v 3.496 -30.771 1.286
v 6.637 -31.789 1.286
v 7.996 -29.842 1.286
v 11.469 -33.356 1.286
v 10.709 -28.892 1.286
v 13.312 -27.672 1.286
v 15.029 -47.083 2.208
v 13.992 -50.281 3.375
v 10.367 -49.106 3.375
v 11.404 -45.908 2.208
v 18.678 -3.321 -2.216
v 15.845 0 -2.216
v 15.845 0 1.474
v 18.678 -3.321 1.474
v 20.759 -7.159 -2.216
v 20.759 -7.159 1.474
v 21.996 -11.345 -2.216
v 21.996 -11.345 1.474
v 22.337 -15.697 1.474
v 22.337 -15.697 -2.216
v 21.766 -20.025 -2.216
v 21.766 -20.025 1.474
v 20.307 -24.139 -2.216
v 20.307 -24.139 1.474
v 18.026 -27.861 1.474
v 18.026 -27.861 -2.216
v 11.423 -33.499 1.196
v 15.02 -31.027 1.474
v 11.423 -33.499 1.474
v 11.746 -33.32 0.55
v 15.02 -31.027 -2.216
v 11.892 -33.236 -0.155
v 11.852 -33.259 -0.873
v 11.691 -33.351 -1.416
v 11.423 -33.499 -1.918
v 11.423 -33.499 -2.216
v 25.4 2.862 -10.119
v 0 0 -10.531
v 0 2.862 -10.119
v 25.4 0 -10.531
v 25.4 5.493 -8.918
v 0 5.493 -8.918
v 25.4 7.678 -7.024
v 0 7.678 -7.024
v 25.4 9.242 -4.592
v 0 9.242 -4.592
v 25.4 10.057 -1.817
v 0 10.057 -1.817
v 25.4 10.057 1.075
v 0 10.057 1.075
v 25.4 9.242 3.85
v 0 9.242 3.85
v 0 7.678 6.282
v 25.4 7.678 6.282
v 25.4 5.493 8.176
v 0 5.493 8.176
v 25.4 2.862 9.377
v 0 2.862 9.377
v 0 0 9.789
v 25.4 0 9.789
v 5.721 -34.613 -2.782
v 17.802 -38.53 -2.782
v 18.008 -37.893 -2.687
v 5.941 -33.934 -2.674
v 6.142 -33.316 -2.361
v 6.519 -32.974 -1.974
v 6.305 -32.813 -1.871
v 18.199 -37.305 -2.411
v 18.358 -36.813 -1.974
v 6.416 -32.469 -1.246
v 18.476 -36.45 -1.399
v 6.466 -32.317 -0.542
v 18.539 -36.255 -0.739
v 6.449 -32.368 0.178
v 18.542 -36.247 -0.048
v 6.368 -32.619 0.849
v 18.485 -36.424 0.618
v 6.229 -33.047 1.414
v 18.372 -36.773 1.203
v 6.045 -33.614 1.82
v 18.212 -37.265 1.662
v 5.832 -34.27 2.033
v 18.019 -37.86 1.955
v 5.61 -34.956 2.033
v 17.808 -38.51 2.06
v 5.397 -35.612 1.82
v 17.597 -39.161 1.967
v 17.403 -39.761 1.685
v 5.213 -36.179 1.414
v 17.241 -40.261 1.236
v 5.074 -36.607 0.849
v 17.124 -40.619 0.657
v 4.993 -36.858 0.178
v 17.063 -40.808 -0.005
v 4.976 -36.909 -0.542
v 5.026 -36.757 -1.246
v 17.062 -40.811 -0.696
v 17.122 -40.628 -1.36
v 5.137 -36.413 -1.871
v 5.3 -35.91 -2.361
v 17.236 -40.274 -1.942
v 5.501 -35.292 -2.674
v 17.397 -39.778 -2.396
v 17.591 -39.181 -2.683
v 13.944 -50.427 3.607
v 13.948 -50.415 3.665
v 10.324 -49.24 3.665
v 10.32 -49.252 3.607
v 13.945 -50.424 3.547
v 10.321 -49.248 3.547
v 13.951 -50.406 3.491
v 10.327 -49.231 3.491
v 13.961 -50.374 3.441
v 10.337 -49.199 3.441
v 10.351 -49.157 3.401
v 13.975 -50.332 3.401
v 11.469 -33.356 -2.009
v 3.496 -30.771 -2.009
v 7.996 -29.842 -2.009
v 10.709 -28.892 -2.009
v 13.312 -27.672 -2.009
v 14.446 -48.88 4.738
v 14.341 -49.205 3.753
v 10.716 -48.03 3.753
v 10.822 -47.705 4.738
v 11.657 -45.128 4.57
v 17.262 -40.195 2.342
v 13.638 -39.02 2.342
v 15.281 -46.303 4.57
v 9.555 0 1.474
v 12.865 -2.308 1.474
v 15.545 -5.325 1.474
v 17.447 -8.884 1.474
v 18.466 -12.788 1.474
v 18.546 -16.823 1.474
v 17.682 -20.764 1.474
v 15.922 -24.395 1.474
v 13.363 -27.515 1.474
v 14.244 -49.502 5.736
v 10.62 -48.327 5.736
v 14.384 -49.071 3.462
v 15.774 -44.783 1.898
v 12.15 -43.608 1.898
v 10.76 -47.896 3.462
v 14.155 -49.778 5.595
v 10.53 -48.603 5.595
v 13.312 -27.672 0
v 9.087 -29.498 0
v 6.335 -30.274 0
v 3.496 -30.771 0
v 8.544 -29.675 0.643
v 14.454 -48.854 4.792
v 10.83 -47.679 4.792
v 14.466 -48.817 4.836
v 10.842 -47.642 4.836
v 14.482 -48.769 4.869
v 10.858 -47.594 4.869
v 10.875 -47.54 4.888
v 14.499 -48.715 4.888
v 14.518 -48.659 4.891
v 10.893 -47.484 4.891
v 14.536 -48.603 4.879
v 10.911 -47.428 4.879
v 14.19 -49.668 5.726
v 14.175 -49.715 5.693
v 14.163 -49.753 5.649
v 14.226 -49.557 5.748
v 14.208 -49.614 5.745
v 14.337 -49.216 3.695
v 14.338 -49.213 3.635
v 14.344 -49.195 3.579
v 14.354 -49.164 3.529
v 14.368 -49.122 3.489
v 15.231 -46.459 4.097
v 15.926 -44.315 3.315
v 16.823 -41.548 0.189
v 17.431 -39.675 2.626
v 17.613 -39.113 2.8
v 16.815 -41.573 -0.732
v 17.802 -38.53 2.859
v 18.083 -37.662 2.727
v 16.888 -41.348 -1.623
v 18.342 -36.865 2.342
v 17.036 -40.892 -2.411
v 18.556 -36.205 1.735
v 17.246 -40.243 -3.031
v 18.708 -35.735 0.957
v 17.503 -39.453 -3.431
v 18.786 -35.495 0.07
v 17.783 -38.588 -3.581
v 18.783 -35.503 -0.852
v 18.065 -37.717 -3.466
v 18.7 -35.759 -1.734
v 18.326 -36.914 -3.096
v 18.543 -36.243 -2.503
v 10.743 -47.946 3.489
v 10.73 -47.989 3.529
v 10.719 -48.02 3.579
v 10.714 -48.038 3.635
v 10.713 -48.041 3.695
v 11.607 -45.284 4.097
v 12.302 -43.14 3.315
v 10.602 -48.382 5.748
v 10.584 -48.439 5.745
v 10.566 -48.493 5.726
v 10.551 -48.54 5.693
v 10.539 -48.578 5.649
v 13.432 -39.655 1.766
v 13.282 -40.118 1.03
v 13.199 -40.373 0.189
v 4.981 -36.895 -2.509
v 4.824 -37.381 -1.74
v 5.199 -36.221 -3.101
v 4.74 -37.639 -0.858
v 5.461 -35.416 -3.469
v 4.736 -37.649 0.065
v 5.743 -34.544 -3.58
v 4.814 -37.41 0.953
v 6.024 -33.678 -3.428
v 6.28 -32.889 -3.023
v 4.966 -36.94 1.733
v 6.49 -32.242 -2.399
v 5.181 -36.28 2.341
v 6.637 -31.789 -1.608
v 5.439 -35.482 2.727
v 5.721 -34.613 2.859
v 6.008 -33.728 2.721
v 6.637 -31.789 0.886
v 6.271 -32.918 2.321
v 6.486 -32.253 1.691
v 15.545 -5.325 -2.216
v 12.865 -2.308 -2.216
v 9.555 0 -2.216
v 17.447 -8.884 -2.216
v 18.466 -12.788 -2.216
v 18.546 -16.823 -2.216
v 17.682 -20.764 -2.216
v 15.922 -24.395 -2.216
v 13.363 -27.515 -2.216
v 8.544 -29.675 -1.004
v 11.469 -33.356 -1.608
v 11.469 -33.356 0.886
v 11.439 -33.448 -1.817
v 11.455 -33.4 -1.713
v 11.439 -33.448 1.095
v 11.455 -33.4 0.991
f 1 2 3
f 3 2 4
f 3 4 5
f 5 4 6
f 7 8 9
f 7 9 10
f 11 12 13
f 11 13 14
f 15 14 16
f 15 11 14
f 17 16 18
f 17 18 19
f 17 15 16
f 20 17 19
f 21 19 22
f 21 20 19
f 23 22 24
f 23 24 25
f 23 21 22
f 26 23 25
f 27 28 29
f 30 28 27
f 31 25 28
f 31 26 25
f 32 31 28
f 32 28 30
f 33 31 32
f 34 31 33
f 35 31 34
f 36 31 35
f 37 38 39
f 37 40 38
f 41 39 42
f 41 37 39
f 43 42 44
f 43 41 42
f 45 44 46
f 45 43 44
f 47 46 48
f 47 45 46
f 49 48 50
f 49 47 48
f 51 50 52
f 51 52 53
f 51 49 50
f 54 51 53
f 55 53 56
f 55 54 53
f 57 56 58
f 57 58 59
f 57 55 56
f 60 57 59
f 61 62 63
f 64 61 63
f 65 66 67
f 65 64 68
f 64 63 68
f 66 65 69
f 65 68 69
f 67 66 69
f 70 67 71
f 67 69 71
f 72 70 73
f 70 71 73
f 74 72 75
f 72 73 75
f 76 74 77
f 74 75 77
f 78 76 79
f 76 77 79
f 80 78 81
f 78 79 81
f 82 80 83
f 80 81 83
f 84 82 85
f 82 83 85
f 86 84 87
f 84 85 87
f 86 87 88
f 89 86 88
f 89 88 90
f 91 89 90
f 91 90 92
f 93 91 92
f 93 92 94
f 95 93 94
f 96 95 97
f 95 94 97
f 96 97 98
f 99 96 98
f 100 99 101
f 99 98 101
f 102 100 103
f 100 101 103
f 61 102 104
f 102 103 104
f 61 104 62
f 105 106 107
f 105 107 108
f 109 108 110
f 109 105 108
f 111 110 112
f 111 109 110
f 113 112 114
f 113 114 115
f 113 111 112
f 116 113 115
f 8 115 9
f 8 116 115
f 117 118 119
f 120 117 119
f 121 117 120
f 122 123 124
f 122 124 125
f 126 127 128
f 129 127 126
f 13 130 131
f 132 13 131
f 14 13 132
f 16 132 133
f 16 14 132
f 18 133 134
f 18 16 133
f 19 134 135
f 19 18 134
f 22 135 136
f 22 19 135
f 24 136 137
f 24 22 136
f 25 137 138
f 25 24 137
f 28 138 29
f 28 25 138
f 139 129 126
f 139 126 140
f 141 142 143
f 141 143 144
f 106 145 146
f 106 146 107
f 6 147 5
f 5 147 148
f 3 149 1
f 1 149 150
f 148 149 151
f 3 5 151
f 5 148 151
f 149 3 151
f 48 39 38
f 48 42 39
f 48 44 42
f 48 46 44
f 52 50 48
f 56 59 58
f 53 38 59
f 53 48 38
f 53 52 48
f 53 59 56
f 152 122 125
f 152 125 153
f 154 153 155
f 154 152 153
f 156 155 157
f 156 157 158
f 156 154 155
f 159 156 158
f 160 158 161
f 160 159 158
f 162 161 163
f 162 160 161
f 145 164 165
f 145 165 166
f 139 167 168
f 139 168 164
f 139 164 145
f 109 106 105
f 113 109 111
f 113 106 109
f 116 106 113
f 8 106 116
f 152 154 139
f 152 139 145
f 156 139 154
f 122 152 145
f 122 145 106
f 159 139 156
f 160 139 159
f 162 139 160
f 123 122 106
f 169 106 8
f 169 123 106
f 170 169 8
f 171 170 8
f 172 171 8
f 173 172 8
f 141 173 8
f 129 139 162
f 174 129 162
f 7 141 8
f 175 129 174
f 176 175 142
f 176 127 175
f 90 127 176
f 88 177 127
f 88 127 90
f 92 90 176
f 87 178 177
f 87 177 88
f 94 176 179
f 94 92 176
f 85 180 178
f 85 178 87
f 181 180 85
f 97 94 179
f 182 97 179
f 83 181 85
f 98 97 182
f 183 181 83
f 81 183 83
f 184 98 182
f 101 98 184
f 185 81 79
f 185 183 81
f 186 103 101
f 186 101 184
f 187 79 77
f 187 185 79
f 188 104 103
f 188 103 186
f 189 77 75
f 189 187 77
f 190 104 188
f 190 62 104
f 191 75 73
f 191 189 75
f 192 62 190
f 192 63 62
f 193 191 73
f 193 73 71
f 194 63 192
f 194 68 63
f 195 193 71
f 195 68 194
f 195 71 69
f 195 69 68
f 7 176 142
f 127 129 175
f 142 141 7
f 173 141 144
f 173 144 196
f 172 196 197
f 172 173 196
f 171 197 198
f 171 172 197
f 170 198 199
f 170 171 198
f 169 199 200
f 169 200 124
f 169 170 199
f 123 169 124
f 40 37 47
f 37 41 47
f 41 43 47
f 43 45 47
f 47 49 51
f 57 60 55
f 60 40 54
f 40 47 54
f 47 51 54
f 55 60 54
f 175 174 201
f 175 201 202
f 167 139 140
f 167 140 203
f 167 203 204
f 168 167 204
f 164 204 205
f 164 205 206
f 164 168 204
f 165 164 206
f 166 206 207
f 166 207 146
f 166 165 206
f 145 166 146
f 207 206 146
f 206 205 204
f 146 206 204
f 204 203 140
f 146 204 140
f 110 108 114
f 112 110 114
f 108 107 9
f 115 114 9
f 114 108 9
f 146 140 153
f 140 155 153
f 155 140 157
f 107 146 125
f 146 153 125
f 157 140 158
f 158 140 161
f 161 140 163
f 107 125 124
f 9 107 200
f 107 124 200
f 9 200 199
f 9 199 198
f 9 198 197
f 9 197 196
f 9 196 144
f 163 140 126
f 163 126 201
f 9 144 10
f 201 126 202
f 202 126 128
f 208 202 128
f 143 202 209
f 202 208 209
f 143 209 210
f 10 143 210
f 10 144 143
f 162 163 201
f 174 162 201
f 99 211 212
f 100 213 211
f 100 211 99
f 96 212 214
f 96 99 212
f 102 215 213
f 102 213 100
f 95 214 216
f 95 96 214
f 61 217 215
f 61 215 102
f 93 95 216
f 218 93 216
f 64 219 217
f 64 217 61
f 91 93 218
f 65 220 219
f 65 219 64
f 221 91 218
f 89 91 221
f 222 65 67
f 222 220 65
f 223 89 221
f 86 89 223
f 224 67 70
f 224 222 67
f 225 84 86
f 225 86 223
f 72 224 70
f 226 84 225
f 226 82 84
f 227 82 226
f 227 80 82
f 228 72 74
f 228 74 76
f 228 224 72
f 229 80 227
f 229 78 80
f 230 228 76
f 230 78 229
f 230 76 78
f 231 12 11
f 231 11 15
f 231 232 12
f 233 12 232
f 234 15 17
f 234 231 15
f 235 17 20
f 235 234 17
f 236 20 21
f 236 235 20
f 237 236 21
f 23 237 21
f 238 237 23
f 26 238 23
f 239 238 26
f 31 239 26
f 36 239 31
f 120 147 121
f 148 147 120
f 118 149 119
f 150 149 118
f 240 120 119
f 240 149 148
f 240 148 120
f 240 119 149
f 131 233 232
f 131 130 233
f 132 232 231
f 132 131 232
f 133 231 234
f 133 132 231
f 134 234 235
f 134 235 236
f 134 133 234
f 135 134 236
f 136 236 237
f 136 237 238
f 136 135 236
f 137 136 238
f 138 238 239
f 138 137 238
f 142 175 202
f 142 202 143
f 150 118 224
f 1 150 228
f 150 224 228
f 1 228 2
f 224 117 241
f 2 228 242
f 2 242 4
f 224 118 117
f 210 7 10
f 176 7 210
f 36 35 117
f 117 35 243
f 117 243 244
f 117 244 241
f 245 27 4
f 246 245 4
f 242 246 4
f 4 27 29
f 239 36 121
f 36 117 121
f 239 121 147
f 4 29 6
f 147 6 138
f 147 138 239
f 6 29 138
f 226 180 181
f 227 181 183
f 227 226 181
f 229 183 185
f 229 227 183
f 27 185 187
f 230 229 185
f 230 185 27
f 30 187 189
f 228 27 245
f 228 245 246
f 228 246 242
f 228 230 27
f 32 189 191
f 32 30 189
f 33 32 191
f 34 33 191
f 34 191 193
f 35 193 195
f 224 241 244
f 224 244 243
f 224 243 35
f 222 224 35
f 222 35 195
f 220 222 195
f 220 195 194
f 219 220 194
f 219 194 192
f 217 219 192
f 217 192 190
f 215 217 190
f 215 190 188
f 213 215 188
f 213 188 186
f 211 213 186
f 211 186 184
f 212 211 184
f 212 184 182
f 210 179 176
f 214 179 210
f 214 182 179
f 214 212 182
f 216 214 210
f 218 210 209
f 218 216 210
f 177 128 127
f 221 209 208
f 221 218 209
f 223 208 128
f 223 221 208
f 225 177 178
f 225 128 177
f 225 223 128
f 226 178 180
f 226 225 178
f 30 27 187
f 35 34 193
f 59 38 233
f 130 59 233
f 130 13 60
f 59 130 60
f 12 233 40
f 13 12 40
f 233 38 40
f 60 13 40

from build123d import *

# Parameters (mm, degrees)
SKETCH1_W               = 25.4
SKETCH1_H               = 10.16
REVOLVE1_ANGLE          = 180
SKETCH4_W               = 6.29000012
SKETCH4_H               = 3.69
SKETCH6_W               = 3.294985449
SKETCH6_H               = 5.974962046
BOSS_EXTRUDE1_DEPTH     = 5.08
SKETCH7_R               = 3.22
BOSS_EXTRUDE7_DEPTH     = 12.7
SKETCH9_W               = 3.294985449
SKETCH9_H               = 5.974962046
BOSS_EXTRUDE8_DEPTH     = 3.302
CUT_EXTRUDE1_DEPTH      = 3.302
CUT_EXTRUDE1_DEPTH_BACK = 3.302
SKETCH11_R              = 2.375
CUT_EXTRUDE2_DEPTH      = 2.54
CUT_EXTRUDE2_DEPTH_BACK = 12.446
BOSS_EXTRUDE11_DEPTH    = 3.81
SKETCH14_R              = 2.420907349
CUT_EXTRUDE3_DEPTH      = 22.606


with BuildPart() as part:
    # Sketch1 → Revolve1 (revolve)
    with BuildSketch(Plane(origin=(0, 0, 0), x_dir=(1, 0, 0), z_dir=(0, 1, 0))):
        with Locations((12.7, 5.451011236)):
            Rectangle(SKETCH1_W, SKETCH1_H)
    revolve(axis=Axis((0, 0, -0.371011236), (1, 0, 0)), revolution_arc=REVOLVE1_ANGLE)

    # Sweep1: sweep along a path in Sketch5
    with BuildLine(Plane.XY) as sweep1_path:
        ThreePointArc((12.7, 0), (20.315428689, -15.331843414), (12.392600359, -30.5071183))
    # Sketch4 → Sweep1 (sweep)
    with BuildSketch(Plane(origin=(0, 0, 0), x_dir=(1, 0, 0), z_dir=(0, 1, 0))):
        with Locations((12.7, 0.371011236)):
            Rectangle(SKETCH4_W, SKETCH4_H)
    sweep(path=sweep1_path.line)

    # Sketch6 → Boss-Extrude1 (add)
    with BuildSketch(Plane(origin=(20.164340987, -6.538110874, 0), x_dir=(0, 0, 1), z_dir=(-0.95124601, 0.308433183, 0))):
        with Locations((-0.361104817, -25.204906835)):
            Rectangle(SKETCH6_W, SKETCH6_H)
    extrude(amount=BOSS_EXTRUDE1_DEPTH)

    # Sketch7 → Boss-Extrude7 (add)
    with BuildSketch(Plane(origin=(15.332011256, -4.971270302, 0), x_dir=(0, 0, 1), z_dir=(-0.95124601, 0.308433183, 0))):
        with Locations((-0.361104816, -31.160979548)):
            Circle(SKETCH7_R)
    extrude(amount=-BOSS_EXTRUDE7_DEPTH)

    # Sketch9 → Boss-Extrude8 (add)
    with BuildSketch(Plane(origin=(15.332011256, -4.971270302, 0), x_dir=(0, 0, 1), z_dir=(-0.95124601, 0.308433183, 0))):
        with Locations((-0.361104817, -25.204906835)):
            Rectangle(SKETCH9_W, SKETCH9_H)
    extrude(amount=BOSS_EXTRUDE8_DEPTH)

    # Sketch10 → Cut-Extrude1 (cut, two sides)
    with BuildSketch(Plane.XY) as cut_extrude1_sk:
        with BuildLine():
            Line((3.495528998, -30.770720391), (5.338405562, -25.087061585))
            Line((5.338405562, -25.087061585), (13.311749617, -27.672348528))
            add(Edge.make_bspline(
                [(13.311749617, -27.672348528), (8.683653097, -30.129373505), (3.495528998, -30.770720391)],
                knots=[0, 0, 0, 1, 1, 1], degree=2))
        make_face()
    extrude(amount=CUT_EXTRUDE1_DEPTH, mode=Mode.SUBTRACT)
    extrude(cut_extrude1_sk.sketch, amount=-CUT_EXTRUDE1_DEPTH_BACK, mode=Mode.SUBTRACT)

    # Sketch11 → Cut-Extrude2 (cut, two sides)
    with BuildSketch(Plane(origin=(27.412835582, -8.888371731, 0), x_dir=(0, 0, -1), z_dir=(0.95124601, -0.308433183, 0))) as cut_extrude2_sk:
        with Locations((0.39169909, -31.12675273)):
            Circle(SKETCH11_R)
    extrude(amount=CUT_EXTRUDE2_DEPTH, mode=Mode.SUBTRACT)
    extrude(cut_extrude2_sk.sketch, amount=-CUT_EXTRUDE2_DEPTH_BACK, mode=Mode.SUBTRACT)

    # Sketch13 → Boss-Extrude11 (add)
    with BuildSketch(Plane(origin=(27.412835582, -8.888371731, 0), x_dir=(0, 0, -1), z_dir=(0.95124601, -0.308433183, 0))):
        Polygon((-2.207938212, -40.151875097), (-0.189276492, -34.333593678), (-2.341873796, -32.910924296), (-4.569820403, -39.332416424), (-4.097443964, -39.496308159), (-3.315450943, -37.242411221), (-1.898321628, -37.734086425), (-2.68031465, -39.987983362), align=None)
        with BuildLine():
            Line((-3.374575741, -43.514412461), (-2.207938212, -40.151875097))
            Line((-2.207938212, -40.151875097), (-2.68031465, -39.987983362))
            Line((-2.68031465, -39.987983362), (-3.462307672, -42.241880299))
            ThreePointArc((-3.462307672, -42.241880299), (-3.5785484, -42.37264764), (-3.75320948, -42.382919506))
            Line((-3.75320948, -42.382919506), (-4.73839778, -42.041106905))
            ThreePointArc((-4.73839778, -42.041106905), (-4.86916512, -41.924866176), (-4.879436986, -41.750205096))
            Line((-4.879436986, -41.750205096), (-4.097443964, -39.496308159))
            Line((-4.097443964, -39.496308159), (-4.569820403, -39.332416424))
            Line((-4.569820403, -39.332416424), (-5.736457932, -42.694953789))
            ThreePointArc((-5.736457932, -42.694953789), (-5.726186066, -42.869614869), (-5.595418726, -42.985855597))
            Line((-5.595418726, -42.985855597), (-3.66547755, -43.655451668))
            ThreePointArc((-3.66547755, -43.655451668), (-3.490816469, -43.645179802), (-3.374575741, -43.514412461))
        make_face()
    extrude(amount=-BOSS_EXTRUDE11_DEPTH)

    # Sketch14 → Cut-Extrude3 (cut)
    with BuildSketch(Plane(origin=(27.412835582, -8.888371731, 0), x_dir=(0, 0, -1), z_dir=(0.95124601, -0.308433183, 0))):
        with Locations((0.361104816, -31.160979548)):
            Circle(SKETCH14_R)
    extrude(amount=-CUT_EXTRUDE3_DEPTH, mode=Mode.SUBTRACT)


solid = part.part
